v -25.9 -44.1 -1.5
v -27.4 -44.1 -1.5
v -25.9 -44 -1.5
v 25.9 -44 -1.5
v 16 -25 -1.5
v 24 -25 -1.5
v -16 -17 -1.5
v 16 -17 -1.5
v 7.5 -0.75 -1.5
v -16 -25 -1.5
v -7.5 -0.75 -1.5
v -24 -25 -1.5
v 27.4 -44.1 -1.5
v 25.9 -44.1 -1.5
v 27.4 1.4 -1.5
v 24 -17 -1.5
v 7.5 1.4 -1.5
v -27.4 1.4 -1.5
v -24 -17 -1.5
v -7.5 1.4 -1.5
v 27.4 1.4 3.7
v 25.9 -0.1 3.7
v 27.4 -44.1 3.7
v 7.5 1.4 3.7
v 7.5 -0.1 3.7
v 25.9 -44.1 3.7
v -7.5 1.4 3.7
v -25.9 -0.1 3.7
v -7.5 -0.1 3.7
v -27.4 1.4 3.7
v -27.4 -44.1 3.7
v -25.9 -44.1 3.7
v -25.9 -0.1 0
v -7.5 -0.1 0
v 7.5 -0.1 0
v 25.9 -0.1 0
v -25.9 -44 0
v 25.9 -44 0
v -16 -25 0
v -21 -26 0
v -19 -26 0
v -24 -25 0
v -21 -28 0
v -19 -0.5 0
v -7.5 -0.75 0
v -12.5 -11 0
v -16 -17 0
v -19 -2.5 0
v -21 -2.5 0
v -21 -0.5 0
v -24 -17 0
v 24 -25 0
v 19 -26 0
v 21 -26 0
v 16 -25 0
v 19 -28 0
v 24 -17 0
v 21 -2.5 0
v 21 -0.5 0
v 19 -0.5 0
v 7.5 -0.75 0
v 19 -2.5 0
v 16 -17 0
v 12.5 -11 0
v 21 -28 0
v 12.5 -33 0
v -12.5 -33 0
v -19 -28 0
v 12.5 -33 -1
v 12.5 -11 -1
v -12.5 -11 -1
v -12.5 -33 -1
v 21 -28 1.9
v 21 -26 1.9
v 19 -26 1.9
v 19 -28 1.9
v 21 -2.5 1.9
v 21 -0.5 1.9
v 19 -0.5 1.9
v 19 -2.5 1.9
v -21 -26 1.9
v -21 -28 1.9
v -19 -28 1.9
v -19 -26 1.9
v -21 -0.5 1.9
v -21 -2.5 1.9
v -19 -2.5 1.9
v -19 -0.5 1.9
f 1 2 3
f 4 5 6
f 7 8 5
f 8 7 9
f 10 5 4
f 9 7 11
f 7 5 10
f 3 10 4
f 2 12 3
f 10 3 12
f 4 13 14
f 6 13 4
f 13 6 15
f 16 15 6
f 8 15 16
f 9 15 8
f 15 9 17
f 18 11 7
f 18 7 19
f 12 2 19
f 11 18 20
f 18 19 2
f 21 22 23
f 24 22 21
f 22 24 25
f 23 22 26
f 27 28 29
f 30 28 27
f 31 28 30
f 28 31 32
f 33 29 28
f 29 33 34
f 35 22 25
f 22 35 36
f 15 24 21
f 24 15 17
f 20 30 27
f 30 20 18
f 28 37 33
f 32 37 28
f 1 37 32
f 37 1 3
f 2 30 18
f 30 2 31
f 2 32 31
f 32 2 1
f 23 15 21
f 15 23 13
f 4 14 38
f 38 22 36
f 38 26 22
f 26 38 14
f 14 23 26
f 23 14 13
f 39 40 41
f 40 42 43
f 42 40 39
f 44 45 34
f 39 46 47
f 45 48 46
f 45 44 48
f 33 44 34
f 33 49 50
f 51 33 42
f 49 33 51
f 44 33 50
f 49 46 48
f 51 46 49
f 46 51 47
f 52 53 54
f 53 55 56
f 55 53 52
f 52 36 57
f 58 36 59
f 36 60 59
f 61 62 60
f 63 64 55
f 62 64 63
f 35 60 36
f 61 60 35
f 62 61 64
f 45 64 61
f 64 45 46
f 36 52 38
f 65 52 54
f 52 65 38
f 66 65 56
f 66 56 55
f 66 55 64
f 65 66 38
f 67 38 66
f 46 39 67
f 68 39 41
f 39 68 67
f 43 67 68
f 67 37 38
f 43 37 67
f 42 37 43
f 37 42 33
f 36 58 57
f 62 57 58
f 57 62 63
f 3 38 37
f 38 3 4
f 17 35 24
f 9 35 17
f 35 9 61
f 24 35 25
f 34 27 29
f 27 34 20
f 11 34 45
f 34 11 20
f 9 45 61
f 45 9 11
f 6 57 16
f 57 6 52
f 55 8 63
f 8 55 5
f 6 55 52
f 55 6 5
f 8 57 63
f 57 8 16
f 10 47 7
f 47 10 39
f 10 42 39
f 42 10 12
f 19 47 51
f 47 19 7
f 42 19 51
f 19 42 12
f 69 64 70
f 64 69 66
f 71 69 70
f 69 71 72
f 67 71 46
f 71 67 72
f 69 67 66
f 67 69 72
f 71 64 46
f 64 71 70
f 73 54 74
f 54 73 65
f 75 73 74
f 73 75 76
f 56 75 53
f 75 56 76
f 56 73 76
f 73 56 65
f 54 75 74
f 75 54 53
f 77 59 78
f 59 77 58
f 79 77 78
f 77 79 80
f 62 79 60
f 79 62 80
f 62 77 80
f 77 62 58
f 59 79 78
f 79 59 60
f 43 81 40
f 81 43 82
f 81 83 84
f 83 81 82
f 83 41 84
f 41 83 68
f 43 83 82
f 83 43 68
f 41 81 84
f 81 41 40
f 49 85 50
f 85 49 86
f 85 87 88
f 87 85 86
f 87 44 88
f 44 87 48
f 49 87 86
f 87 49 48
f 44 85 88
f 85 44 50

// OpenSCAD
// The Microbit is a cool new thing from eth BBC.
// It runs micropython.

// I wrote a flam simulator on it and this panel fits on top
// So you can adjust the parameters with the buttons and// see a diffuse fire display through the plastic shell

// Can be found on Thingiverse http://www.thingiverse.com/thing:1165549


board_w = 52;    // Width of the Microbit
board_h = 44;    // Height of the Microbit
board_d = 1.7;   // Thickness of the circuit board
standoff = 2;    // How far off does the fire_place stand from the board
thickness = 1.5; // Thickness of the 3D print in general.
//
fire_pane_w = 25;    // Height of the display LEDs
fire_pane_h = 22;    // Width of the display LEDs
fire_pane_off = 10;  // Distance from base to bottom of display recess
fire_pane_d = 0.5;   // Thin section over the LEDs to diffuse them.
//
button_off_w = 4;   // Offset of buttons from side
button_off_h = 17;  // Offset of buttons from base of Microbit
button_w = 8;       // Width of buttons
//
usb_w = 15;     // width of recess for the USB plug


Delta = 0.1; // used to make sure things overlap properly for a nice 3D model

//--------------------------------------------------------------------------
// The base plate or panel
module plate() {
	translate([0,board_h/2,thickness/2])
		cube(size=[board_w,board_h, thickness], center=true);
}

// hole for a button (mirrored for other side)
module button() {
	translate([(board_w-button_off_w-button_w)/2, button_off_h+button_w/2,0])
		cube(size=[button_w,button_w,button_w], center=true);
}

// Recess for USB plug
module usb() {
	h = board_d+standoff+thickness+Delta*2;
	translate([0,-thickness/2,-thickness-Delta])
		cube([usb_w,thickness*2,h*2],center=true);
}

// Little standoffs to seat board height properly
module standoff() {
	translate([(board_w-button_off_w-button_w)/2, board_h-button_off_h, Delta-standoff/2])
		cube([standoff,standoff,standoff], center=true);
	translate([(board_w-button_off_w-button_w)/2, thickness, Delta-standoff/2])
		cube([standoff,standoff,standoff], center=true);
}

// Sides and bottom lip
module sides() {
	h = board_d+standoff+thickness;
	// bottom
	translate([0,-thickness/2+Delta, thickness-h/2])
		cube([board_w, thickness, h ], center=true);
	// side 1
	translate([-(thickness+board_w)/2+Delta,(board_h-thickness)/2+Delta, thickness-h/2])
		cube([thickness, board_h+thickness, h ], center=true);
	// side 2
	translate([(thickness+board_w)/2-Delta,(board_h-thickness)/2+Delta, thickness-h/2])
		cube([thickness, board_h+thickness, h ], center=true);
}


//The entire object made of parts
module fire_place() {
	difference() {
		// baseplate and sides
		union() {
			plate();
			sides();
		}
		// subtracting USB, buttons, LED region
		usb();
		button();
		mirror([1,0,0])
			button();
		// flame region
		translate([0,fire_pane_h,thickness/2-fire_pane_d])
			cube([fire_pane_w,fire_pane_h,thickness], center=true);
	}
	// Add standoffs
	standoff();
	mirror([1,0,0])
			standoff();
	// Some measures to make sure its all working right :)
	// color([1,0,0])
		// cube([32,1,1], center=true);
	// color([1,0,0])
	// translate([board_w/2,button_off_h/2,3])
		// cube([1,button_off_h,1], center=true);
}

// Make it upside down so can be printed easily.
rotate([180,0,0])
	fire_place();
